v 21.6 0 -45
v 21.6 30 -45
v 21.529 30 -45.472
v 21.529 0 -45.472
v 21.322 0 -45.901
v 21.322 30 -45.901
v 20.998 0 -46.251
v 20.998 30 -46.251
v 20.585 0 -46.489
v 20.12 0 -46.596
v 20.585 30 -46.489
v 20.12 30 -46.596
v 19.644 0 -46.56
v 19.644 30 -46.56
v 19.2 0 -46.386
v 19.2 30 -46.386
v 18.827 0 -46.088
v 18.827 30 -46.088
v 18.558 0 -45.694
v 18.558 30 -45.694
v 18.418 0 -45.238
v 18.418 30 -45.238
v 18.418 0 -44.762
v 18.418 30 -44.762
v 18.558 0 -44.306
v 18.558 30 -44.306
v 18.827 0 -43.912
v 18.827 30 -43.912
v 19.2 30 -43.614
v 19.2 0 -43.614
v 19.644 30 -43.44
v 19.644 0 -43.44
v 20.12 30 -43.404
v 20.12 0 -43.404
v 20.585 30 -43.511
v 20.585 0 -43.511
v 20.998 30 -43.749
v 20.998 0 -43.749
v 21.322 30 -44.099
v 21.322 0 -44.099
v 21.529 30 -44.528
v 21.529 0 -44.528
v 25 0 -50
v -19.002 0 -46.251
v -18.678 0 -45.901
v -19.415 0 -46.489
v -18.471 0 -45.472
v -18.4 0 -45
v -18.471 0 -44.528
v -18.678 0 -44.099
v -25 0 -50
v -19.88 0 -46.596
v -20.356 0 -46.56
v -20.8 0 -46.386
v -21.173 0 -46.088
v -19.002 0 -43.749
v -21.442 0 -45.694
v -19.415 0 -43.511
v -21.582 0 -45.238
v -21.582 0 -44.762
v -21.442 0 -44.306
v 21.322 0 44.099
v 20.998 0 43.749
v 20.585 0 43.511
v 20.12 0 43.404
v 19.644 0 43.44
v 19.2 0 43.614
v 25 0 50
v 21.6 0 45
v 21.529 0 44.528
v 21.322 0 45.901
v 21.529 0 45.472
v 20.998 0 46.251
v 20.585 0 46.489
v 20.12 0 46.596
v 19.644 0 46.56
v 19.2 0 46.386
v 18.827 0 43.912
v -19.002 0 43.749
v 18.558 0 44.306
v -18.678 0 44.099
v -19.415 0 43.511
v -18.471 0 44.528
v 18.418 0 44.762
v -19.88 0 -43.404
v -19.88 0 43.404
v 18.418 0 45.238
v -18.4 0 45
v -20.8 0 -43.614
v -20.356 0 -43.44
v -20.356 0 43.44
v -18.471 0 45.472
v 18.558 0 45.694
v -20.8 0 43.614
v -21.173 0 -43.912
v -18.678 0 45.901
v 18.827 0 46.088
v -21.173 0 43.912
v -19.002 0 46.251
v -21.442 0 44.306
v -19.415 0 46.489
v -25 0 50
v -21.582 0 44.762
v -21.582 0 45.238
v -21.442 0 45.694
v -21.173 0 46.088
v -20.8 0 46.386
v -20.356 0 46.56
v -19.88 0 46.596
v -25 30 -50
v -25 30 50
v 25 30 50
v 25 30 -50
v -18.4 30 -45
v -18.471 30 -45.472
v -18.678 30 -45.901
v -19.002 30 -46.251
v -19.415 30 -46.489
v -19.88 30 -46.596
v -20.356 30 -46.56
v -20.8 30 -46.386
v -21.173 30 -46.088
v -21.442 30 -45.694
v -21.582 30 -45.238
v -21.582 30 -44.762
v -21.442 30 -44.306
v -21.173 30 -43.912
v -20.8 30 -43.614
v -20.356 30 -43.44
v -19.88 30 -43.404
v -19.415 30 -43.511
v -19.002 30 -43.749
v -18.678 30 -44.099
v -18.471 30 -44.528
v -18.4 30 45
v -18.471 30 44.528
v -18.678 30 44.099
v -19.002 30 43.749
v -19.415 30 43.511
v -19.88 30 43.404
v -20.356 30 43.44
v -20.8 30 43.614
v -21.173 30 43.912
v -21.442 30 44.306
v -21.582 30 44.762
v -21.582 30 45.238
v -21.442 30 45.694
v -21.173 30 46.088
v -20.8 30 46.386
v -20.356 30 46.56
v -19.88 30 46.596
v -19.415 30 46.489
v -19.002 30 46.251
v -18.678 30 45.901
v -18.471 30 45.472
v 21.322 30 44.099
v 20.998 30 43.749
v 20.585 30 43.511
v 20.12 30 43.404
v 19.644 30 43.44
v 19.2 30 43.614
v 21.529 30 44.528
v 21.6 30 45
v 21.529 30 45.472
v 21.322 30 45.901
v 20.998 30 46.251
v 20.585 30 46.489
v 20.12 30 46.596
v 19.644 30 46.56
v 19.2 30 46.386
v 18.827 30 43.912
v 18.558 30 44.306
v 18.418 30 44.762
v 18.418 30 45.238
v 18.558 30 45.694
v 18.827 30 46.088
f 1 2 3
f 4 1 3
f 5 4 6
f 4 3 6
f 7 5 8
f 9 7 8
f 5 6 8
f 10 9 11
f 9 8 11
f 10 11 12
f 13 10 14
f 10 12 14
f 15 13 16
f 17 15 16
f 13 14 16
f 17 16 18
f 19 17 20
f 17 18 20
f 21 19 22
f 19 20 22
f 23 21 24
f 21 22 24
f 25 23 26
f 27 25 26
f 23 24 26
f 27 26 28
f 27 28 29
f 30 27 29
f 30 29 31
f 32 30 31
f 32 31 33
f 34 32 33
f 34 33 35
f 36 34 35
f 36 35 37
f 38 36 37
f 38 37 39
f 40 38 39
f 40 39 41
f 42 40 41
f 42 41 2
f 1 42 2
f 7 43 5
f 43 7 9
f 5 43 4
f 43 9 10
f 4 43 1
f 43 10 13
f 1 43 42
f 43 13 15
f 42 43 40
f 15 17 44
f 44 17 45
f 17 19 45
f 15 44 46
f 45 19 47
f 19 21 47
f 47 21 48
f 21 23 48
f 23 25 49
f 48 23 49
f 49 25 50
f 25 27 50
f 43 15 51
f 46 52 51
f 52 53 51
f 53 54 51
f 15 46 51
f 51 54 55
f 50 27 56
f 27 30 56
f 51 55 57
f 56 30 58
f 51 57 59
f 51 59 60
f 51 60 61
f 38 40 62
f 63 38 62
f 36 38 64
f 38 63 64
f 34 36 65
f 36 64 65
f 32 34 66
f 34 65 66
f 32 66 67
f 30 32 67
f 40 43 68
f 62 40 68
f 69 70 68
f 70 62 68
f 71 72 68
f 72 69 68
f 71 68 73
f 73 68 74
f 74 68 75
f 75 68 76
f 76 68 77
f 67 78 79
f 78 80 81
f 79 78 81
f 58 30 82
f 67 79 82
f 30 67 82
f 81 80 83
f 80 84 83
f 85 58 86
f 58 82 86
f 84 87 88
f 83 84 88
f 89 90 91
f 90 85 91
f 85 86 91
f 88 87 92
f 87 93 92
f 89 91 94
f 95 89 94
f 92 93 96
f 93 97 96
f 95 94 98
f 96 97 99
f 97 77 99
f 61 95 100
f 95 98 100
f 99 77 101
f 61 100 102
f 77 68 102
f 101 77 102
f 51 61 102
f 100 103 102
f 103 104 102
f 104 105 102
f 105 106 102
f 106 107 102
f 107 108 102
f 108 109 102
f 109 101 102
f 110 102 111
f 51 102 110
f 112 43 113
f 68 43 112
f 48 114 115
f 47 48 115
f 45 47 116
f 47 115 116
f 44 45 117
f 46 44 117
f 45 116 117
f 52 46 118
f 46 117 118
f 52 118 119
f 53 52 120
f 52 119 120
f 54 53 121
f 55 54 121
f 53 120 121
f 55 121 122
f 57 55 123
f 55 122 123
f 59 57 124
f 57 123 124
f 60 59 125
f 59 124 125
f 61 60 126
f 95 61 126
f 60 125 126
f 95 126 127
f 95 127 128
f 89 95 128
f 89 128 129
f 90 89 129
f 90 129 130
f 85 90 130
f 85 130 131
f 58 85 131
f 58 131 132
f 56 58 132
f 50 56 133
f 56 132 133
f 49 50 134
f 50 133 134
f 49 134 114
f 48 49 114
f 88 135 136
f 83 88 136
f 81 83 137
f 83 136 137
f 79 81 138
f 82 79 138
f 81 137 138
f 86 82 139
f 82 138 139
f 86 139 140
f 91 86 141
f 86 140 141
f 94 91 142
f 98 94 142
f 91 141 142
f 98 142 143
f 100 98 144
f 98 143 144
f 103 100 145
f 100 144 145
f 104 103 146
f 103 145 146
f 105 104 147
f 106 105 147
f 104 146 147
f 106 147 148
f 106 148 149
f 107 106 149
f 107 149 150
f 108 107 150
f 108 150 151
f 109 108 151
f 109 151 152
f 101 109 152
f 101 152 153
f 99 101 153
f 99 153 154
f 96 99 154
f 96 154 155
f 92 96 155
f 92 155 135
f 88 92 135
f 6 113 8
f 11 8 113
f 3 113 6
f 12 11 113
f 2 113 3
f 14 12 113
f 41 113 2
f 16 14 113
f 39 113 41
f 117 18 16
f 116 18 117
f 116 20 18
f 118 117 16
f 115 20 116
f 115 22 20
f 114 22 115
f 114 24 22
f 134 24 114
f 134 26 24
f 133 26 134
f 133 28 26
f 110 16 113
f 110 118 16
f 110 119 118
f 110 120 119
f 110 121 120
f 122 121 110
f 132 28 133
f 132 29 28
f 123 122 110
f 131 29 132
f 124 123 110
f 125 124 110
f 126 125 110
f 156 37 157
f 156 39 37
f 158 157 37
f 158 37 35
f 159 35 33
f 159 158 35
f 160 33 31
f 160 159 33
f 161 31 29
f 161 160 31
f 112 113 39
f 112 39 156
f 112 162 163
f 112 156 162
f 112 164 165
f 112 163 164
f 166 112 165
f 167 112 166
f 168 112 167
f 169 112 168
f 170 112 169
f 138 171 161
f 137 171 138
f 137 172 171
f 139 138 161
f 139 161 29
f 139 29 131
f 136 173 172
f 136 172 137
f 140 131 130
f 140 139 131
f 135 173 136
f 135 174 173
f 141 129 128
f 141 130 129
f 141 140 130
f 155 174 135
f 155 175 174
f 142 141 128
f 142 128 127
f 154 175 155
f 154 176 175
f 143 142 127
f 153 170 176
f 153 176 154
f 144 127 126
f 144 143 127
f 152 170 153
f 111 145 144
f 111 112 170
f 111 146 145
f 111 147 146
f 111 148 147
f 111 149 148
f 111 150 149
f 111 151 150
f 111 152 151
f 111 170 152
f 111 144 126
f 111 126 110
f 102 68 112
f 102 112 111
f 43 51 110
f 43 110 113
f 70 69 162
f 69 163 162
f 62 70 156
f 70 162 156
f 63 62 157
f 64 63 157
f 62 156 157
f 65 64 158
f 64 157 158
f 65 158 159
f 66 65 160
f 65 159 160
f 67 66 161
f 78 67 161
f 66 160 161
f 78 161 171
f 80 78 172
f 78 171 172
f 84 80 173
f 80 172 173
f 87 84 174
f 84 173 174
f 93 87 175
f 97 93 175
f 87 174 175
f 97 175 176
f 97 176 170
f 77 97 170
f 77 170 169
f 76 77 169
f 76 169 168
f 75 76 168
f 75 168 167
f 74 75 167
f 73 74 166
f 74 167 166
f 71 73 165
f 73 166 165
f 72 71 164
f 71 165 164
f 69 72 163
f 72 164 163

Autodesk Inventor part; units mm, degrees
ref_plane "YZ Plane" through (0, 0, 0) normal (1, 0, 0) x (0, 1, 0)
ref_plane "XZ Plane" through (0, 0, 0) normal (0, 1, 0) x (-1, 0, 0)
ref_plane "XY Plane" through (0, 0, 0) normal (0, 0, 1) x (1, 0, 0)
sketch "Эскиз1" plane through (0, 0, 0) normal (0, 1, 0) x (-1, 0, 0)
  line L0 (-25, 50) -> (25, 50)
  line L1 (25, 50) -> (25, -50)
  line L2 (25, -50) -> (-25, -50)
  line L3 (-25, -50) -> (-25, 50)
  line L4 (-25, 50) -> (25, -50) construction
  line L5 (25, 50) -> (-25, -50) construction
  point P0 (0, 0)
  dimension "d0" = 50
  dimension "d1" = 100
extrude "Выдавливание1" add sketch "Эскиз1" along normal blind 30
sketch "Эскиз2" plane through (0, 30, 0) normal (0, 1, 0) x (1, 0, 0)
  line L0 (25, 50) -> (-25, 50) projected
  line L1 (-25, 50) -> (-25, -50) projected
  line L2 (-25, -50) -> (25, -50) projected
  line L3 (25, -50) -> (25, 50) projected
  circle A0 centre (20, 45) radius 1.6
  circle A1 centre (20, -45) radius 1.6
  circle A2 centre (-20, -45) radius 1.6
  arc A3 (-20, 52.5) -> (-25, 47.5) centre (-20, 45) ccw projected
  circle A4 centre (-20, 45) radius 1.6
  circle A5 centre (-20, 45) radius 5
  circle A6 centre (20, 45) radius 5
  circle A7 centre (20, -45) radius 5
  circle A8 centre (-20, -45) radius 5
  line L4 (-25, 50) -> (-25, -50) projected
  line L5 (-25, -50) -> (25, -50) projected
  line L6 (25, -50) -> (25, 50) projected
  line L7 (25, 50) -> (-25, 50) projected
  point P0 (0, 0)
  dimension "d5" = 3.2
  dimension "d6" = 3.2
  dimension "d7" = 3.2
  dimension "d8" = 3.2
  dimension "d11" = 10
  dimension "d12" = 10
  dimension "d13" = 10
  dimension "d14" = 10
extrude "Выдавливание2" cut sketch "Эскиз2" against normal blind 30 contours A0 | A1 | A2 | A4
sketch "Эскиз3" plane through (0, 0, 0) normal (0, -1, 0) x (1, 0, 0)
  line L0 (25, -50) -> (-25, -50) projected
  line L1 (0, -50) -> (0, 30)
  line L2 (0, 30) -> (25, 30)
  line L3 (25, 50) -> (25, -50) projected
  line L4 (-25, 50) -> (25, 50) projected
  line L5 (25, 50) -> (15, 50)
  line L6 (15, 50) -> (15, 30)
  circle A0 centre (-20, -45) radius 1.6 projected
  circle A1 centre (20, 45) radius 1.6 projected
  circle A2 centre (20, -45) radius 1.6 projected
  circle A3 centre (-20, 45) radius 1.6 projected
  line L7 (25, -50) -> (-25, -50) projected
  line L8 (25, 50) -> (25, -50) projected
  line L9 (-25, 50) -> (25, 50) projected
  line L10 (-25, -50) -> (-25, 50) projected
  point P0 (0, 0)
  dimension "d15" = 80
  dimension "d16" = 25
  dimension "d17" = 10
  dimension "d18" = 20
sketch "Эскиз4" plane through (-25, 0, -50) normal (-1, 0, 0) x (0, 0, 1)
  point P0 (50, 0)
properties part number "LPS_board"
